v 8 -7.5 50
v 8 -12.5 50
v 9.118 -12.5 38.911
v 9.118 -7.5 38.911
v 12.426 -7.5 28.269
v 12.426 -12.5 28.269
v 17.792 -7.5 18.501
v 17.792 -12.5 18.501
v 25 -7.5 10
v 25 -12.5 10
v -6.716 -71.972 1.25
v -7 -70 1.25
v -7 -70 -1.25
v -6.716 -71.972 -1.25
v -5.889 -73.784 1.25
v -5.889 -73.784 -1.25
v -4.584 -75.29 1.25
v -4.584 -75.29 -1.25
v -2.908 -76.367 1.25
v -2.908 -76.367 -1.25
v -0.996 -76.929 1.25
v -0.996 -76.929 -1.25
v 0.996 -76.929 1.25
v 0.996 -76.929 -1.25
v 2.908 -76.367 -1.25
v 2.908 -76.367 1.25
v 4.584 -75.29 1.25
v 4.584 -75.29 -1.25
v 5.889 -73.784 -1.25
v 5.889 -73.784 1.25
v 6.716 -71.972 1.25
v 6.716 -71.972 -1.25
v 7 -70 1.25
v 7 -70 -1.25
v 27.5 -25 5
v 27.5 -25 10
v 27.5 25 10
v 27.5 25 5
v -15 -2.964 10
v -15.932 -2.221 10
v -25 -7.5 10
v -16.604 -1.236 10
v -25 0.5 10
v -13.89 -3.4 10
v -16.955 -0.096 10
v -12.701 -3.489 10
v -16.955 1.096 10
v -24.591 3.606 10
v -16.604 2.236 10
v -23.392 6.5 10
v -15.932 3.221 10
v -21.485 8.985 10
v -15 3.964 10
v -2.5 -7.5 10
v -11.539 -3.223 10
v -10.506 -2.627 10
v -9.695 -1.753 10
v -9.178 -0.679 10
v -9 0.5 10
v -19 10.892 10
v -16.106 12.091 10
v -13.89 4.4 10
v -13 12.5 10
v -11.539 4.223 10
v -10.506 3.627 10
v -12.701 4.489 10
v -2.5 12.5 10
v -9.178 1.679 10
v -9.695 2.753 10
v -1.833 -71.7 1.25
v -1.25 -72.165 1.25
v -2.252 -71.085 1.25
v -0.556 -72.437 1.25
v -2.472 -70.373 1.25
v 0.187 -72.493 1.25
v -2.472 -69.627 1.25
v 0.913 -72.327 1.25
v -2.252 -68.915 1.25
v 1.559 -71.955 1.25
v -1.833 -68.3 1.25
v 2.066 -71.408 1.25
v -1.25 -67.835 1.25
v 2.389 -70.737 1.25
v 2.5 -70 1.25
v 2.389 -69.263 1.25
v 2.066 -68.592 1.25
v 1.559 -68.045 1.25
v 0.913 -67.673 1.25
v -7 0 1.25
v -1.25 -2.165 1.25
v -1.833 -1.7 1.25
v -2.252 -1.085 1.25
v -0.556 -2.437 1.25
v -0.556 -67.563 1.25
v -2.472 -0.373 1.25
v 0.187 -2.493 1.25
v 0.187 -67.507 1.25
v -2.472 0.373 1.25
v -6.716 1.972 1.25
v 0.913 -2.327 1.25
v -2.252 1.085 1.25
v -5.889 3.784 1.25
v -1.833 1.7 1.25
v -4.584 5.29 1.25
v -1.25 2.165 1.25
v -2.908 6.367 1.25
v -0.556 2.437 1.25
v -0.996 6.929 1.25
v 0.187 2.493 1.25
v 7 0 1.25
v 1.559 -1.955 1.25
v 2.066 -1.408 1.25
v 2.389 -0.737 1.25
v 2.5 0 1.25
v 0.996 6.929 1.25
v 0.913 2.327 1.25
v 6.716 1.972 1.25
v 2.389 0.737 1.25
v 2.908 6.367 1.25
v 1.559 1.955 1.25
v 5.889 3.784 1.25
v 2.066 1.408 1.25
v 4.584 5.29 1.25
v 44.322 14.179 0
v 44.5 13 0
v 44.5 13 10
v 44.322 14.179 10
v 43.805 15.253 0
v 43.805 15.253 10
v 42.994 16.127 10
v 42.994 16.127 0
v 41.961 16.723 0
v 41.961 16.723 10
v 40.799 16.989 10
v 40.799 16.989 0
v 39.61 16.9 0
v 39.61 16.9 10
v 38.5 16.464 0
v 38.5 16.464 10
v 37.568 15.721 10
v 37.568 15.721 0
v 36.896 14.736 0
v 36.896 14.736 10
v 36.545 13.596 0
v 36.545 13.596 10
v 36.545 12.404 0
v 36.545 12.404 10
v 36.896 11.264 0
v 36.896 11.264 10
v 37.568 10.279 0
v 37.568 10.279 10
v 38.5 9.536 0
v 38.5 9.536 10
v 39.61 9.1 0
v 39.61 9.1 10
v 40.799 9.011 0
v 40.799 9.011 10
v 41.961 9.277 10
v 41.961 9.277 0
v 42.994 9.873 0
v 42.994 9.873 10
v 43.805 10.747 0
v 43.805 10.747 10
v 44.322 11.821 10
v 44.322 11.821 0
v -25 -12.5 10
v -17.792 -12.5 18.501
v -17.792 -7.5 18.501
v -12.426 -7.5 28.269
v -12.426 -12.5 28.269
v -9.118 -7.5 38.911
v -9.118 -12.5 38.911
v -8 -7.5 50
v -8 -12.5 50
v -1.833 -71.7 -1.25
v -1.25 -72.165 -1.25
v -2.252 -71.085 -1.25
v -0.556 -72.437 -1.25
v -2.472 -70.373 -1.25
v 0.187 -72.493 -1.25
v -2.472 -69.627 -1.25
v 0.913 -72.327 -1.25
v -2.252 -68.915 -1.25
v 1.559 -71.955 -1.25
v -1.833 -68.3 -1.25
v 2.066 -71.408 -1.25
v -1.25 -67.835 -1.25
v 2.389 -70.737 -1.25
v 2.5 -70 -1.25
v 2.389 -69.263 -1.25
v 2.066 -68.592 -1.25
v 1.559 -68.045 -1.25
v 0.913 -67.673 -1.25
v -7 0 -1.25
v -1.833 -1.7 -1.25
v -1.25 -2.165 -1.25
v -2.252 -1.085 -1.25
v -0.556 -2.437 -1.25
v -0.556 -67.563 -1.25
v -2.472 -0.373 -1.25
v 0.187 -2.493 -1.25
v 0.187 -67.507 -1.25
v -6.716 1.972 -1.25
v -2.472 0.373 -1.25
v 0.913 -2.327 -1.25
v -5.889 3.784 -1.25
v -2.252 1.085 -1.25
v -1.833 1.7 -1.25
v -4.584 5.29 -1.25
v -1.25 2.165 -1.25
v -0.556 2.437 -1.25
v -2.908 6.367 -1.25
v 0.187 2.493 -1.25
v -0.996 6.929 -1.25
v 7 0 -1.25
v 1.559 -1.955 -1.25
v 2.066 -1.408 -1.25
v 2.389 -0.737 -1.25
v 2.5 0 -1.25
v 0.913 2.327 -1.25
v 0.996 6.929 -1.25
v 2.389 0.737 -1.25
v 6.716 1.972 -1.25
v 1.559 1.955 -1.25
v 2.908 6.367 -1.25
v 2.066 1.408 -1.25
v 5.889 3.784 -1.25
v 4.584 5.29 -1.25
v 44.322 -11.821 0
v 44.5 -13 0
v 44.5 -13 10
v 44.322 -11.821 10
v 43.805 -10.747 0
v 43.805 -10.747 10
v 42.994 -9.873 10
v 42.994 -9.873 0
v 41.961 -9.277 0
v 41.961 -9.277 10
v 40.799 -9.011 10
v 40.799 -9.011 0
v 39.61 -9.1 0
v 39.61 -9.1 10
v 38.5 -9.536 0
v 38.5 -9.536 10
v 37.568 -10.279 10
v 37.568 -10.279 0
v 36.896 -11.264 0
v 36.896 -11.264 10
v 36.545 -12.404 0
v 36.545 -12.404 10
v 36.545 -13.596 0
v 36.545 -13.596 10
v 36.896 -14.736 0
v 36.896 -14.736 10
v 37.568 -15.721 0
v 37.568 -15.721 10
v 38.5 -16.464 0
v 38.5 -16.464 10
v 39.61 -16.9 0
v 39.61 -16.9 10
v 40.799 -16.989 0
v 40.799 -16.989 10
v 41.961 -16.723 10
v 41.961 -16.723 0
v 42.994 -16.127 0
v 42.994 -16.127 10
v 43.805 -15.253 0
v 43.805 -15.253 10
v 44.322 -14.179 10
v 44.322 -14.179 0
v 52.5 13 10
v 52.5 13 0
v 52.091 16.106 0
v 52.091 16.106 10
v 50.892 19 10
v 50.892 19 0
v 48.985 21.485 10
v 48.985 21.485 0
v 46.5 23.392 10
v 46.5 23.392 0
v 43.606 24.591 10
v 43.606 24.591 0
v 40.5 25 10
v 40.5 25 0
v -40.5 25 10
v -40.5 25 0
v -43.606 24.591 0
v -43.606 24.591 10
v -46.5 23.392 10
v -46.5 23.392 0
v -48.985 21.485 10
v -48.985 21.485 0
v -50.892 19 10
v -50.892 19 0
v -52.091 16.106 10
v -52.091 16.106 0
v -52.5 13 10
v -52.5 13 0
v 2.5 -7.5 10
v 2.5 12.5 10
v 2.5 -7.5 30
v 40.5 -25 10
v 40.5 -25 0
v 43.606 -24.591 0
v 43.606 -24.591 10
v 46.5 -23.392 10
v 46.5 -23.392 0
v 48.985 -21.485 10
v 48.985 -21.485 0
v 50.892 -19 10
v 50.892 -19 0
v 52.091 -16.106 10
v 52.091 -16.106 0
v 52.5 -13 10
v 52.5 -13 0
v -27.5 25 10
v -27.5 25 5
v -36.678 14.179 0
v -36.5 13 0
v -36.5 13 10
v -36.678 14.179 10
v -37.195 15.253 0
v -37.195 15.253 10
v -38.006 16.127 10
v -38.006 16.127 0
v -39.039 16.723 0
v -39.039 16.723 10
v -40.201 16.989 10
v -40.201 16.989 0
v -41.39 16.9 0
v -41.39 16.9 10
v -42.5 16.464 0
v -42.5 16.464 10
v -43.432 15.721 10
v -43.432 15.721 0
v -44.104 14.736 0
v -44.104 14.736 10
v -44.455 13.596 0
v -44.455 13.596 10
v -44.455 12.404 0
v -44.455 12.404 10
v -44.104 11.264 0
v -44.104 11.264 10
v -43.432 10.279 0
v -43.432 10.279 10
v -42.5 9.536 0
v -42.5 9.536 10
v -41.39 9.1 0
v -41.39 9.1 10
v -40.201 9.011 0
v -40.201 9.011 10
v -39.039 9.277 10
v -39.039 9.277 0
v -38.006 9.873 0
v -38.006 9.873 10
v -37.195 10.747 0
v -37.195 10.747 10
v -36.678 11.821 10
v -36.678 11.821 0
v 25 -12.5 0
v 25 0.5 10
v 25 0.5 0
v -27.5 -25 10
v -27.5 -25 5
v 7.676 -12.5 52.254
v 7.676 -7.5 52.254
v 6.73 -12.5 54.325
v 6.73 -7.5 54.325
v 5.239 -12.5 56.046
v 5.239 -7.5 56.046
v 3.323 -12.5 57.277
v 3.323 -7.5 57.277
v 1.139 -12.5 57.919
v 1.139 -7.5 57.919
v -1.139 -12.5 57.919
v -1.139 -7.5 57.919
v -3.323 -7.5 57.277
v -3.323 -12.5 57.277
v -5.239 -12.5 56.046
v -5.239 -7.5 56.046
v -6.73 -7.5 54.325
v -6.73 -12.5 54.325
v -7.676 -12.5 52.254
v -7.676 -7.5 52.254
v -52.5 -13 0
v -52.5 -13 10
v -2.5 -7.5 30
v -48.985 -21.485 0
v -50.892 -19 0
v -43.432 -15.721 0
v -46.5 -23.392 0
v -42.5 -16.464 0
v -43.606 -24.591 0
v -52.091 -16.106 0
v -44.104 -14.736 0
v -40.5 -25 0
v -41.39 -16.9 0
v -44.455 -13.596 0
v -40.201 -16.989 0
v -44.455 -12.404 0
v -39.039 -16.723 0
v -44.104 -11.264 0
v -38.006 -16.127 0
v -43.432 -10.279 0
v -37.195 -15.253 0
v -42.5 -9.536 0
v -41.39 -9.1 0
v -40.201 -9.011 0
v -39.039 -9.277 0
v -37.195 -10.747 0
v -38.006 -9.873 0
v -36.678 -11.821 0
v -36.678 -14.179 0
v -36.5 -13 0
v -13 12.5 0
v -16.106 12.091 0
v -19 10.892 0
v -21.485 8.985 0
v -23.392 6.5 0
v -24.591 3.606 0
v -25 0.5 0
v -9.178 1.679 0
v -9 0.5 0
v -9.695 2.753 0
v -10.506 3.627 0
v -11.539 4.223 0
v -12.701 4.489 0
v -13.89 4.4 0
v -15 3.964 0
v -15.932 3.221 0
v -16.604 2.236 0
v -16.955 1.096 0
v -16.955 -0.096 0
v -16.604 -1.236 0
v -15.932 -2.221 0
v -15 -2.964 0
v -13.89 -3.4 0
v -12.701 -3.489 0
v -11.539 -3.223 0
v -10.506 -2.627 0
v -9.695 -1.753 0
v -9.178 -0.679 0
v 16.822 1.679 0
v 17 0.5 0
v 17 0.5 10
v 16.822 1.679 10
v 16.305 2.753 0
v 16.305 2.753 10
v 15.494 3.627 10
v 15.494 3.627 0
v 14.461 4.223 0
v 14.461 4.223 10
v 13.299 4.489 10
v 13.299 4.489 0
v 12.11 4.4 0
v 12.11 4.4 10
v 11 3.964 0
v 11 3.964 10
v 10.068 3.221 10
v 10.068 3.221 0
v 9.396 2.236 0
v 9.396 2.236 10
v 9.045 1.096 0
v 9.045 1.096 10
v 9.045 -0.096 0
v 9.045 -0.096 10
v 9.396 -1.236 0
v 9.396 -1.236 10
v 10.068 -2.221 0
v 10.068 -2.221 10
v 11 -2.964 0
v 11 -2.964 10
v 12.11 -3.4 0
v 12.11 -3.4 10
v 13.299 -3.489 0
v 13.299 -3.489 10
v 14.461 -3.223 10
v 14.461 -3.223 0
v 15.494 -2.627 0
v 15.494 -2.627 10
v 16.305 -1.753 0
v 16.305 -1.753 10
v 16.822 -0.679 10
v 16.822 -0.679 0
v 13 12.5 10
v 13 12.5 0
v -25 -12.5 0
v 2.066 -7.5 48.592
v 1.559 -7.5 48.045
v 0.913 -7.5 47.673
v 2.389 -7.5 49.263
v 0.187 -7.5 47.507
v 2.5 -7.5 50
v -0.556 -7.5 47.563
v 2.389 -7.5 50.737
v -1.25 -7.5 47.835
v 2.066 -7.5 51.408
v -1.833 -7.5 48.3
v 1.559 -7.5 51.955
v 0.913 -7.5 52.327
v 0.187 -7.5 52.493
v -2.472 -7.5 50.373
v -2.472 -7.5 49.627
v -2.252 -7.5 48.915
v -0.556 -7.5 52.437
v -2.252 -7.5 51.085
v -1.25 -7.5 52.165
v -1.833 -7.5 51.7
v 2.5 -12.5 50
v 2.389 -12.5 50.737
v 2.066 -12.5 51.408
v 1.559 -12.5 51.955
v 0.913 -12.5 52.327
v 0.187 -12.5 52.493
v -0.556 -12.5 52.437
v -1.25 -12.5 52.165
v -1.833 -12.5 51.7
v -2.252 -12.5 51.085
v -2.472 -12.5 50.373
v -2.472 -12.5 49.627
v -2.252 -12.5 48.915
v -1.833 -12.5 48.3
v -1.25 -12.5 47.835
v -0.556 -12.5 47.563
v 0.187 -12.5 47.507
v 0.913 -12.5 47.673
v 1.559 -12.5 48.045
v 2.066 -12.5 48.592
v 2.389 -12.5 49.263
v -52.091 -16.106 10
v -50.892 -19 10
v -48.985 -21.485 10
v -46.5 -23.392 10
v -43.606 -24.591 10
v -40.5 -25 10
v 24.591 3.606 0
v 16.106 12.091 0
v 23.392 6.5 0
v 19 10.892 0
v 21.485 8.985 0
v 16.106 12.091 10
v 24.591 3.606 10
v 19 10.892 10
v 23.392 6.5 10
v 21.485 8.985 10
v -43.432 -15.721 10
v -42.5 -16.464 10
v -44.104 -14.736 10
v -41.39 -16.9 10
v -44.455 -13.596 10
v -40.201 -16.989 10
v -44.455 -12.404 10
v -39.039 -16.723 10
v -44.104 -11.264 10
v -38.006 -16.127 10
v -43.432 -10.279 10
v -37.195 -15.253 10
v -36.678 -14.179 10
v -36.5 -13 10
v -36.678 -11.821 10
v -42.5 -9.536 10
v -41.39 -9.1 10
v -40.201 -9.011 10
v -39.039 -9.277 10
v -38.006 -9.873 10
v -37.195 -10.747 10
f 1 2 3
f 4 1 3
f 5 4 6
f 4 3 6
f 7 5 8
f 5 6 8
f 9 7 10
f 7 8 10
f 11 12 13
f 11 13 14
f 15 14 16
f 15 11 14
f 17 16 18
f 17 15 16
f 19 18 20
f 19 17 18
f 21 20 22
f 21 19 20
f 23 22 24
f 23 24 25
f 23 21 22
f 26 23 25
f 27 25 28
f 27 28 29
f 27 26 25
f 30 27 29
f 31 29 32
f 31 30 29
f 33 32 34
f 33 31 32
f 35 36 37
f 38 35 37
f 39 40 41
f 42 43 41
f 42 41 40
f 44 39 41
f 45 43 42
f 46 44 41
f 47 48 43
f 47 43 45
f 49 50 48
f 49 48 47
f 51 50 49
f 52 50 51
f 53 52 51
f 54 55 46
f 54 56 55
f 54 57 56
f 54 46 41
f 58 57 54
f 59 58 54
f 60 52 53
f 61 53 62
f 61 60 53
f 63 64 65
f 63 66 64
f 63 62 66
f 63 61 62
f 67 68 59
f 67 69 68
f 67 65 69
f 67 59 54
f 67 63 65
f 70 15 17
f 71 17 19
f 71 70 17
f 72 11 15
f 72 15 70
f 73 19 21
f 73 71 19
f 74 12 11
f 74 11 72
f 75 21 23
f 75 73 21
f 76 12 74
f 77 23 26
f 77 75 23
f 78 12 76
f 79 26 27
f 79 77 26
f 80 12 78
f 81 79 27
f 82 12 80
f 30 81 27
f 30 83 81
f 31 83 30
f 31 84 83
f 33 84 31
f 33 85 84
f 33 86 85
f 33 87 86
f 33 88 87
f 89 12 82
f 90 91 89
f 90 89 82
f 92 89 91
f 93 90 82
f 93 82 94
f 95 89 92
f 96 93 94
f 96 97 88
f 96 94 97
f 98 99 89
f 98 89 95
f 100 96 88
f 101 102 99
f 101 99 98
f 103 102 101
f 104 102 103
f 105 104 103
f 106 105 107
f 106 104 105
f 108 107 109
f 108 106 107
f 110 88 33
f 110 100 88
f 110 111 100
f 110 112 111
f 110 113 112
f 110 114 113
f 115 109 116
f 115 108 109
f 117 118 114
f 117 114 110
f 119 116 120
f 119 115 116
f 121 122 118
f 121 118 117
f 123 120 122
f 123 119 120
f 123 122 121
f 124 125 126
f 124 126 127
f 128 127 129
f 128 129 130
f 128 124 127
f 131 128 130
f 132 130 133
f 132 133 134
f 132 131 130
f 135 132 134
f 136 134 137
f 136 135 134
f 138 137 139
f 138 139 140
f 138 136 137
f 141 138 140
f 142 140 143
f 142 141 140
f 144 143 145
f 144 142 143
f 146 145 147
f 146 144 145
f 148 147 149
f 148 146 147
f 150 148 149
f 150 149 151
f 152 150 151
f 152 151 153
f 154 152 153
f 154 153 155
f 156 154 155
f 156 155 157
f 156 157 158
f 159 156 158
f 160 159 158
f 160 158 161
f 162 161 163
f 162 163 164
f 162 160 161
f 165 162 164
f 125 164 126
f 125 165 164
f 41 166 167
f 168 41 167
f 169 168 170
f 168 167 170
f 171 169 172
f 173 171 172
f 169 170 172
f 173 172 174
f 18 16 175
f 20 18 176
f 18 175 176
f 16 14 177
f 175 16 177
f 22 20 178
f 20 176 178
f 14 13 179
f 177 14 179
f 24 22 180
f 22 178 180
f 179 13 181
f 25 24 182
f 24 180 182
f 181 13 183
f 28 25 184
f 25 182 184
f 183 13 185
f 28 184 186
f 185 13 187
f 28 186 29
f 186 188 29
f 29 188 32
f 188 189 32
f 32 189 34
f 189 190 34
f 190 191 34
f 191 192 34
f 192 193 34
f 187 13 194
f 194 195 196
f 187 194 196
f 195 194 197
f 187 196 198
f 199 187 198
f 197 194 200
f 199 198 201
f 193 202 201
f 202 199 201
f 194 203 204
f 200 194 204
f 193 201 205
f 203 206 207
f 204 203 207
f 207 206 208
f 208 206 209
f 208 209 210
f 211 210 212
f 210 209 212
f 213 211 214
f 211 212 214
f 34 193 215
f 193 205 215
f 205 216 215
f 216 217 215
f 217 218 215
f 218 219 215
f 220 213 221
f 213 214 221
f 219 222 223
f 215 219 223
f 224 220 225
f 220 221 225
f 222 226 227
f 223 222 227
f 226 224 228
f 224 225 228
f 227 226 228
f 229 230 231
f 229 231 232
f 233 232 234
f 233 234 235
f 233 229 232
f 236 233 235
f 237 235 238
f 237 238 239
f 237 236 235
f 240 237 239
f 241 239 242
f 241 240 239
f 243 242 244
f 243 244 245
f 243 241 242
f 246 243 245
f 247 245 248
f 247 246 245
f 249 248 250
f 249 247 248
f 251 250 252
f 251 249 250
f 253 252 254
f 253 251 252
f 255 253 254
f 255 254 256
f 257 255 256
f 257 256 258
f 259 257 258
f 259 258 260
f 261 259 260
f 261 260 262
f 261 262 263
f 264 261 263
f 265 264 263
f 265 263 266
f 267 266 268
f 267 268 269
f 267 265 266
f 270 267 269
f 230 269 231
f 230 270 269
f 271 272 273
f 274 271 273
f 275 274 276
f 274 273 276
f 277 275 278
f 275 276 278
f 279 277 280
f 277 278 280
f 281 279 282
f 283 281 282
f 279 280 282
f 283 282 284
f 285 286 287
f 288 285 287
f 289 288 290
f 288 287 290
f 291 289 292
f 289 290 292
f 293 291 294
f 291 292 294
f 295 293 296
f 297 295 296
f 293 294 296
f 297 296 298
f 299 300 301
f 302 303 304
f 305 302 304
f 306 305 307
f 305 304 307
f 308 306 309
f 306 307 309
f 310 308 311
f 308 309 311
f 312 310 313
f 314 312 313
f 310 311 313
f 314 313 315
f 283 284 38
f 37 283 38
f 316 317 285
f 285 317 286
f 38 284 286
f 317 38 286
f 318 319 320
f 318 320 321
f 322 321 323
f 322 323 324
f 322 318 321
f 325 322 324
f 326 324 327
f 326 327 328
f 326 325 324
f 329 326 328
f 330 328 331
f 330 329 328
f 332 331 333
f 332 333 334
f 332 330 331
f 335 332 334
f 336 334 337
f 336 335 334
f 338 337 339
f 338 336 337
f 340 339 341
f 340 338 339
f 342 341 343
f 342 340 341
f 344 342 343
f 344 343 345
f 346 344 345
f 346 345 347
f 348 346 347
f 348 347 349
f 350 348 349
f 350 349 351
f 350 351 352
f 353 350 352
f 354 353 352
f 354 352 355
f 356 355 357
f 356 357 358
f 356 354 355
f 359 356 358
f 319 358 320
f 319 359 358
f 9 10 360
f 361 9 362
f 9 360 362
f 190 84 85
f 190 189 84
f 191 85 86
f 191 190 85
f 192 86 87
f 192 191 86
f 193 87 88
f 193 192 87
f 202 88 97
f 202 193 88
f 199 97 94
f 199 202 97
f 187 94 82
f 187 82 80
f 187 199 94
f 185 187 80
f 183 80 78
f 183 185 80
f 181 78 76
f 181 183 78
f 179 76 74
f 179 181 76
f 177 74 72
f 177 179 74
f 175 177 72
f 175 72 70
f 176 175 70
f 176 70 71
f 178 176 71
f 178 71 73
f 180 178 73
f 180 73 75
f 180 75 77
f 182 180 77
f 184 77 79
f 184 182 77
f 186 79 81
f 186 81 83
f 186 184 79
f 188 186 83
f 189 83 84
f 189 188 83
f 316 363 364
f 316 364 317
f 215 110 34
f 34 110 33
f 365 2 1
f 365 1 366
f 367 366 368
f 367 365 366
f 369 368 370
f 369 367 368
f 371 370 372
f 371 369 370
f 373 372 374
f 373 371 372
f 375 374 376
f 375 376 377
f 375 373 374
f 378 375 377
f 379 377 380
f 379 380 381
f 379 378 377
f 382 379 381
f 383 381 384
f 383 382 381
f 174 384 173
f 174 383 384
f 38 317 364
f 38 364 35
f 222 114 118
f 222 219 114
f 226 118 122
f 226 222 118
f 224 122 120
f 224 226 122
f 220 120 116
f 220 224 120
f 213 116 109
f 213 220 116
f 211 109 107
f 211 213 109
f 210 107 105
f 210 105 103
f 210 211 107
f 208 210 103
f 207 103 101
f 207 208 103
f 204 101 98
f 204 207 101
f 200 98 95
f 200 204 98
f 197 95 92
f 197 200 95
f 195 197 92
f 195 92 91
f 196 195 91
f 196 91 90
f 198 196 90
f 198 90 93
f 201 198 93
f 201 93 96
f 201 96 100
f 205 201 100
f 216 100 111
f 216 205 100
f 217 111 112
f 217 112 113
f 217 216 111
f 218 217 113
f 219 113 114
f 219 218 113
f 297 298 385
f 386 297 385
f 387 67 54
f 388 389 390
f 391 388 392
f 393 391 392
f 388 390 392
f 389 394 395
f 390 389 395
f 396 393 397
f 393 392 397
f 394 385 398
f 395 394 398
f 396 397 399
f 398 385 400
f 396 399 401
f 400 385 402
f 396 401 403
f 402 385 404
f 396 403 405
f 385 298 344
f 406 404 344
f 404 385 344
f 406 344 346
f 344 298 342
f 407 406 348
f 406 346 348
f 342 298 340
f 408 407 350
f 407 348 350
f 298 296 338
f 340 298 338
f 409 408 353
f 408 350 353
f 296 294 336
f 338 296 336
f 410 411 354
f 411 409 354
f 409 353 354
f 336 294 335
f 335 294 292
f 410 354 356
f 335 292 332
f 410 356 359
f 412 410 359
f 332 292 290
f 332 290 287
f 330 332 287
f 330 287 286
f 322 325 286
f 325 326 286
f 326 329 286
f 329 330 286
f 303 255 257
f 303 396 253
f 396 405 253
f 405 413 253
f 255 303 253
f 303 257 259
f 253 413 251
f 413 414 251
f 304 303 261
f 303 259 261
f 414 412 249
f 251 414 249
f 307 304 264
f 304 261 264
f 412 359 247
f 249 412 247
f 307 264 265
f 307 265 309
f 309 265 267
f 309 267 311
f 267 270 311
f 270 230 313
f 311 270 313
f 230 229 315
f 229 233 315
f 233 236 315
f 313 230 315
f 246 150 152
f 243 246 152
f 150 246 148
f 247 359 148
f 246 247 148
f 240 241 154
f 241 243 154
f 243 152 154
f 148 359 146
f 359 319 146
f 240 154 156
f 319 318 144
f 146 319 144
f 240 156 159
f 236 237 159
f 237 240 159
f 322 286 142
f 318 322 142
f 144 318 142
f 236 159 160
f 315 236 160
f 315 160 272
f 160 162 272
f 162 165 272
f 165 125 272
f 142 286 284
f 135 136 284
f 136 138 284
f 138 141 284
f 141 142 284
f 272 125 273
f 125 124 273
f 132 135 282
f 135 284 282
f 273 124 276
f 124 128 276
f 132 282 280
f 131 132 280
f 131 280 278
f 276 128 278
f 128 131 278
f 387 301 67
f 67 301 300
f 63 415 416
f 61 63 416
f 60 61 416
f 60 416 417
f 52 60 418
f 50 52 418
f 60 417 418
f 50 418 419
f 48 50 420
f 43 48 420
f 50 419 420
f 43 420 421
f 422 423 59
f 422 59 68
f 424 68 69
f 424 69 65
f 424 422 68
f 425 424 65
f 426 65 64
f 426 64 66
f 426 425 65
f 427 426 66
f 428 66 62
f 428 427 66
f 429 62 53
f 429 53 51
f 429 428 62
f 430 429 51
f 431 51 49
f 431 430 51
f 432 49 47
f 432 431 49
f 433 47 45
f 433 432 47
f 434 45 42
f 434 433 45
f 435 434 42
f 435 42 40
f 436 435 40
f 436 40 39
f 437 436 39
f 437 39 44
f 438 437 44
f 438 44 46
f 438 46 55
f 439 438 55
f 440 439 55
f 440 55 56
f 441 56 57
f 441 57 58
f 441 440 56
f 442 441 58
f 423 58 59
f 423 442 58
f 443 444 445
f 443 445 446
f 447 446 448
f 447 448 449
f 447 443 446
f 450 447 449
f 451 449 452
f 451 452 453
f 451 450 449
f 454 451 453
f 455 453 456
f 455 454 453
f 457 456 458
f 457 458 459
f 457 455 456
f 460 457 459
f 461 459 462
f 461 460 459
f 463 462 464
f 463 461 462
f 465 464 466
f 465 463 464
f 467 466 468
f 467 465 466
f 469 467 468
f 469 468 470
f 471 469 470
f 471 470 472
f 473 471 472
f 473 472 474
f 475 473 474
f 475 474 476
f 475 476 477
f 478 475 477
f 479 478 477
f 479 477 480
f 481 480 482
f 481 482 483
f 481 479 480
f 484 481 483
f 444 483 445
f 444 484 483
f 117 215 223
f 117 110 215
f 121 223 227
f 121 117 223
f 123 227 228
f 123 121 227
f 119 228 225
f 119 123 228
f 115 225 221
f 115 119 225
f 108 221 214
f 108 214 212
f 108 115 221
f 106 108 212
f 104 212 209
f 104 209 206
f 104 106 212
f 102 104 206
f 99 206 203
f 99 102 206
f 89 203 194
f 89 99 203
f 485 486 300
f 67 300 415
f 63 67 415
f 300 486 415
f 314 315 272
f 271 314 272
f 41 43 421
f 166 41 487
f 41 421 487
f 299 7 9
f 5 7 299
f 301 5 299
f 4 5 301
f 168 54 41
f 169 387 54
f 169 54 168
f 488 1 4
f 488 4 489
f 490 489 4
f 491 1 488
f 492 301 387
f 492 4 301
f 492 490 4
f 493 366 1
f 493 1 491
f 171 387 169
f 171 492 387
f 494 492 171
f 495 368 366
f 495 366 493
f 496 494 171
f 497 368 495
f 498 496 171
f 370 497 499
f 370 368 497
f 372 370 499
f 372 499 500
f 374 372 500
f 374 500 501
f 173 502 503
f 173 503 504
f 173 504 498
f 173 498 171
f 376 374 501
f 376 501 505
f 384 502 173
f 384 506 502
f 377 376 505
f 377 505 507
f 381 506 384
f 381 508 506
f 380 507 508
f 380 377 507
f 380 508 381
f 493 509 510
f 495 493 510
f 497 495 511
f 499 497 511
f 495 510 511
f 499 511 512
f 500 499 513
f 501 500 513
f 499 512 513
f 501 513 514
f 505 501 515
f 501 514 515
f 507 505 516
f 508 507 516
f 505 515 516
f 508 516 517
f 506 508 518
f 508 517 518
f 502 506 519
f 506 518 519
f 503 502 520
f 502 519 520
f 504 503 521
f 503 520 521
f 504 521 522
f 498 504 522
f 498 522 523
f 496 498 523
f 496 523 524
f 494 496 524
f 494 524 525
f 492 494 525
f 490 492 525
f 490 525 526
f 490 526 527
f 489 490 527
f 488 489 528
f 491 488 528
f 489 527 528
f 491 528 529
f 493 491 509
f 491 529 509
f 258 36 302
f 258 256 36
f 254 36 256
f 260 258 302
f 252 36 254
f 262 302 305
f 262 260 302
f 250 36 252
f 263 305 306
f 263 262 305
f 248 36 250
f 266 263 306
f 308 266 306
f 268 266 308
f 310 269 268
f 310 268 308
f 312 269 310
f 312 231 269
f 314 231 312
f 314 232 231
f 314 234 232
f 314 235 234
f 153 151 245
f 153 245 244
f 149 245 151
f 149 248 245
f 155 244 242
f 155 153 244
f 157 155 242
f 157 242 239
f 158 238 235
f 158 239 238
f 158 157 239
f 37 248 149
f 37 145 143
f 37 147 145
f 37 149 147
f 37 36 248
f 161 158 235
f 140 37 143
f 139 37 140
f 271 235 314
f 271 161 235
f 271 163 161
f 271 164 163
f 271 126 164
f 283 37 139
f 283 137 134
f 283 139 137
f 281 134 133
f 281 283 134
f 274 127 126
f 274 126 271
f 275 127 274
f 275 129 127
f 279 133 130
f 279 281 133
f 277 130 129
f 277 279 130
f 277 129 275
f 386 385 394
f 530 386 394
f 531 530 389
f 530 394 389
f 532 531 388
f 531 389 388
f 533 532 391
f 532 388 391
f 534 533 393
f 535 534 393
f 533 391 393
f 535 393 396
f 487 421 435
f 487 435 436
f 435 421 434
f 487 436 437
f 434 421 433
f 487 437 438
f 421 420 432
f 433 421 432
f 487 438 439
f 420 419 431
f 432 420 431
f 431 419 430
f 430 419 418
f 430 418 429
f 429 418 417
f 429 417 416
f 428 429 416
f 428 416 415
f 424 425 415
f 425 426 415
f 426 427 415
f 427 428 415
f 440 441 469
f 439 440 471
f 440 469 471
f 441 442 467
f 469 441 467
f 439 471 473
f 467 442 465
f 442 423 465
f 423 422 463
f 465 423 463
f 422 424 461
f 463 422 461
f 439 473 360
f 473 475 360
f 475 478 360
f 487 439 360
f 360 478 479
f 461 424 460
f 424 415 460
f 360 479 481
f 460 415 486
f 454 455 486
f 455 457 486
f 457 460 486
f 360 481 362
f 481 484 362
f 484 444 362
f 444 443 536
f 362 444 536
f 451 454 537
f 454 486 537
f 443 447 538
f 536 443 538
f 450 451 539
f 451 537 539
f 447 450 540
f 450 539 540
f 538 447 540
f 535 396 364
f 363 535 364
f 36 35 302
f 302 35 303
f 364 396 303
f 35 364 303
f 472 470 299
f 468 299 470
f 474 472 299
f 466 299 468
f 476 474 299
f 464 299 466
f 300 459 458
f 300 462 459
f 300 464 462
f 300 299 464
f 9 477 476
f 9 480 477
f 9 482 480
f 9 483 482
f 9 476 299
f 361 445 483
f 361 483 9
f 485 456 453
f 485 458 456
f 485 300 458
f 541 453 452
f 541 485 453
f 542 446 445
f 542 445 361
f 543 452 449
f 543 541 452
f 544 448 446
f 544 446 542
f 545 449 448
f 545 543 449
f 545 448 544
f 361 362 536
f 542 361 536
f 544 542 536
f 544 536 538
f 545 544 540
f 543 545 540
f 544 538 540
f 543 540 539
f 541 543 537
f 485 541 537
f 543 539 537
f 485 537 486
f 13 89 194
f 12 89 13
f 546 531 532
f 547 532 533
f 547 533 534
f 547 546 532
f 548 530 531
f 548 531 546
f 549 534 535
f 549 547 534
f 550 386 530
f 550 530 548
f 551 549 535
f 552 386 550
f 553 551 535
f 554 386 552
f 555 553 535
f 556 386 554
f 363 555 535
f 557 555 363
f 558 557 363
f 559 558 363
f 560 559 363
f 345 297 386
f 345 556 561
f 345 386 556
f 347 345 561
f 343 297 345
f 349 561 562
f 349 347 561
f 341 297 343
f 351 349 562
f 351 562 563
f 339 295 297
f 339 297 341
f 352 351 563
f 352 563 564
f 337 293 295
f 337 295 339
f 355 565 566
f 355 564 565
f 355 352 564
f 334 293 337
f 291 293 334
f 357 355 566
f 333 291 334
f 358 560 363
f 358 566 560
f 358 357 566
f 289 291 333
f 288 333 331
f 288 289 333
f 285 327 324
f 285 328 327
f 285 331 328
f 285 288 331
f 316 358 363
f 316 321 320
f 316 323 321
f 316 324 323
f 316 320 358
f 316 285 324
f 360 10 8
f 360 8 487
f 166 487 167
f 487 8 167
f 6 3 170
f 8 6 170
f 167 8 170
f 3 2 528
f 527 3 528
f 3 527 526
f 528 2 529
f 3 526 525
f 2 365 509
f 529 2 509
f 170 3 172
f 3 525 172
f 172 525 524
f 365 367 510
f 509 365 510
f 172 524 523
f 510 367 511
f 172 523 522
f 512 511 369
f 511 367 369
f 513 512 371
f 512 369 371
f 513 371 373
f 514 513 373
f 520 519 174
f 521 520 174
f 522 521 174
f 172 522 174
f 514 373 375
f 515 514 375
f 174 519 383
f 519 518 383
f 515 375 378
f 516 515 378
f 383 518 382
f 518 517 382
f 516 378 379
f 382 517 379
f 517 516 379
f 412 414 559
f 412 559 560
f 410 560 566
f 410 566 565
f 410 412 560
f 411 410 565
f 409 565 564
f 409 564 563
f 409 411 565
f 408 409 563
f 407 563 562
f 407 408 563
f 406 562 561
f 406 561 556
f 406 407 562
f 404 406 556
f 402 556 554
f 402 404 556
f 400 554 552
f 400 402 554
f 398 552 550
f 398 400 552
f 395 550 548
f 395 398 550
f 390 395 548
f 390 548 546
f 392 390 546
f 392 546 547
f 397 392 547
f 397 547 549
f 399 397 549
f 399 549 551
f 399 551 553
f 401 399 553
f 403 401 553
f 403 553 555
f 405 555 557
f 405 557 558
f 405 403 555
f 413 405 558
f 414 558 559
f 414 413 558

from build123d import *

# Parameters (mm, degrees)
SKETCH_R     = 4
PAD_DEPTH    = 10
SKETCH001_W  = 55
SKETCH001_H  = 50
POCKET_DEPTH = 5
SKETCH002_R  = 4
PAD001_DEPTH = 10
SKETCH004_R  = 2.5
PAD002_DEPTH = 5
PAD004_DEPTH = 2.5
SKETCH009_R  = 2.5
PAD005_DEPTH = 1.25


with BuildPart() as base:
    # Sketch → Pad (new body)
    with BuildSketch(Plane.XY):
        with BuildLine():
            Line((-52.5, 13), (-52.5, -13))
            ThreePointArc((-52.5, -13), (-48.985281, -21.485281), (-40.5, -25))
            Line((-40.5, -25), (40.5, -25))
            ThreePointArc((40.5, -25), (48.985281, -21.485281), (52.5, -13))
            Line((52.5, -13), (52.5, 13))
            ThreePointArc((52.5, 13), (48.985281, 21.485281), (40.5, 25))
            Line((40.5, 25), (-40.5, 25))
            ThreePointArc((-40.5, 25), (-48.985281, 21.485281), (-52.5, 13))
        make_face()
        with Locations((-40.5, 13)):
            Circle(SKETCH_R, mode=Mode.SUBTRACT)
        with Locations((40.5, 13)):
            Circle(SKETCH_R, mode=Mode.SUBTRACT)
        with Locations((40.5, -13)):
            Circle(SKETCH_R, mode=Mode.SUBTRACT)
        with Locations((-40.5, -13)):
            Circle(SKETCH_R, mode=Mode.SUBTRACT)
    extrude(amount=PAD_DEPTH)

    # Sketch001 (on Face14 of Pad) → Pocket (cut)
    with BuildSketch(Plane.XY.offset(10)):
        Rectangle(SKETCH001_W, SKETCH001_H)
    extrude(amount=-POCKET_DEPTH, mode=Mode.SUBTRACT)


with BuildPart() as bracket:
    # Sketch002 → Pad001 (new body)
    with BuildSketch(Plane.XY):
        with BuildLine():
            Line((-25, -12.5), (25, -12.5))
            Line((25, -12.5), (25, 0.5))
            ThreePointArc((25, 0.5), (21.485281, 8.985281), (13, 12.5))
            Line((13, 12.5), (-13, 12.5))
            ThreePointArc((-13, 12.5), (-21.485281, 8.985281), (-25, 0.5))
            Line((-25, 0.5), (-25, -12.5))
        make_face()
        with Locations((13, 0.5)):
            Circle(SKETCH002_R, mode=Mode.SUBTRACT)
        with Locations((-13, 0.5)):
            Circle(SKETCH002_R, mode=Mode.SUBTRACT)
    extrude(amount=PAD001_DEPTH)

    # Sketch004 (on Face1 of Pad001) → Pad002 (join)
    with BuildSketch(Plane.XZ.offset(12.5)):
        with BuildLine():
            ThreePointArc((-25, 10), (-12.42632, 28.268686), (-8, 50))
            ThreePointArc((8, 50), (0, 58), (-8, 50))
            ThreePointArc((8, 50), (12.42632, 28.268686), (25, 10))
            Line((-25, 10), (25, 10))
        make_face()
        with Locations((0, 50)):
            Circle(SKETCH004_R, mode=Mode.SUBTRACT)
    extrude(amount=-PAD002_DEPTH)

    # Sketch008 → Pad004 (join, symmetric)
    with BuildSketch(Plane.YZ):
        Polygon((-7.5, 10), (-7.5, 30), (12.5, 10), align=None)
    extrude(amount=PAD004_DEPTH, both=True)


with BuildPart() as links:
    # Sketch009 → Pad005 (new body, symmetric)
    with BuildSketch(Plane.XY):
        with BuildLine():
            ThreePointArc((7, 0), (0, 7), (-7, 0))
            Line((-7, 0), (-7, -70))
            ThreePointArc((-7, -70), (0, -77), (7, -70))
            Line((7, 0), (7, -70))
        make_face()
        Circle(SKETCH009_R, mode=Mode.SUBTRACT)
        with Locations((0, -70)):
            Circle(SKETCH009_R, mode=Mode.SUBTRACT)
    extrude(amount=PAD005_DEPTH, both=True)


solid = Compound([base.part, bracket.part, links.part])
